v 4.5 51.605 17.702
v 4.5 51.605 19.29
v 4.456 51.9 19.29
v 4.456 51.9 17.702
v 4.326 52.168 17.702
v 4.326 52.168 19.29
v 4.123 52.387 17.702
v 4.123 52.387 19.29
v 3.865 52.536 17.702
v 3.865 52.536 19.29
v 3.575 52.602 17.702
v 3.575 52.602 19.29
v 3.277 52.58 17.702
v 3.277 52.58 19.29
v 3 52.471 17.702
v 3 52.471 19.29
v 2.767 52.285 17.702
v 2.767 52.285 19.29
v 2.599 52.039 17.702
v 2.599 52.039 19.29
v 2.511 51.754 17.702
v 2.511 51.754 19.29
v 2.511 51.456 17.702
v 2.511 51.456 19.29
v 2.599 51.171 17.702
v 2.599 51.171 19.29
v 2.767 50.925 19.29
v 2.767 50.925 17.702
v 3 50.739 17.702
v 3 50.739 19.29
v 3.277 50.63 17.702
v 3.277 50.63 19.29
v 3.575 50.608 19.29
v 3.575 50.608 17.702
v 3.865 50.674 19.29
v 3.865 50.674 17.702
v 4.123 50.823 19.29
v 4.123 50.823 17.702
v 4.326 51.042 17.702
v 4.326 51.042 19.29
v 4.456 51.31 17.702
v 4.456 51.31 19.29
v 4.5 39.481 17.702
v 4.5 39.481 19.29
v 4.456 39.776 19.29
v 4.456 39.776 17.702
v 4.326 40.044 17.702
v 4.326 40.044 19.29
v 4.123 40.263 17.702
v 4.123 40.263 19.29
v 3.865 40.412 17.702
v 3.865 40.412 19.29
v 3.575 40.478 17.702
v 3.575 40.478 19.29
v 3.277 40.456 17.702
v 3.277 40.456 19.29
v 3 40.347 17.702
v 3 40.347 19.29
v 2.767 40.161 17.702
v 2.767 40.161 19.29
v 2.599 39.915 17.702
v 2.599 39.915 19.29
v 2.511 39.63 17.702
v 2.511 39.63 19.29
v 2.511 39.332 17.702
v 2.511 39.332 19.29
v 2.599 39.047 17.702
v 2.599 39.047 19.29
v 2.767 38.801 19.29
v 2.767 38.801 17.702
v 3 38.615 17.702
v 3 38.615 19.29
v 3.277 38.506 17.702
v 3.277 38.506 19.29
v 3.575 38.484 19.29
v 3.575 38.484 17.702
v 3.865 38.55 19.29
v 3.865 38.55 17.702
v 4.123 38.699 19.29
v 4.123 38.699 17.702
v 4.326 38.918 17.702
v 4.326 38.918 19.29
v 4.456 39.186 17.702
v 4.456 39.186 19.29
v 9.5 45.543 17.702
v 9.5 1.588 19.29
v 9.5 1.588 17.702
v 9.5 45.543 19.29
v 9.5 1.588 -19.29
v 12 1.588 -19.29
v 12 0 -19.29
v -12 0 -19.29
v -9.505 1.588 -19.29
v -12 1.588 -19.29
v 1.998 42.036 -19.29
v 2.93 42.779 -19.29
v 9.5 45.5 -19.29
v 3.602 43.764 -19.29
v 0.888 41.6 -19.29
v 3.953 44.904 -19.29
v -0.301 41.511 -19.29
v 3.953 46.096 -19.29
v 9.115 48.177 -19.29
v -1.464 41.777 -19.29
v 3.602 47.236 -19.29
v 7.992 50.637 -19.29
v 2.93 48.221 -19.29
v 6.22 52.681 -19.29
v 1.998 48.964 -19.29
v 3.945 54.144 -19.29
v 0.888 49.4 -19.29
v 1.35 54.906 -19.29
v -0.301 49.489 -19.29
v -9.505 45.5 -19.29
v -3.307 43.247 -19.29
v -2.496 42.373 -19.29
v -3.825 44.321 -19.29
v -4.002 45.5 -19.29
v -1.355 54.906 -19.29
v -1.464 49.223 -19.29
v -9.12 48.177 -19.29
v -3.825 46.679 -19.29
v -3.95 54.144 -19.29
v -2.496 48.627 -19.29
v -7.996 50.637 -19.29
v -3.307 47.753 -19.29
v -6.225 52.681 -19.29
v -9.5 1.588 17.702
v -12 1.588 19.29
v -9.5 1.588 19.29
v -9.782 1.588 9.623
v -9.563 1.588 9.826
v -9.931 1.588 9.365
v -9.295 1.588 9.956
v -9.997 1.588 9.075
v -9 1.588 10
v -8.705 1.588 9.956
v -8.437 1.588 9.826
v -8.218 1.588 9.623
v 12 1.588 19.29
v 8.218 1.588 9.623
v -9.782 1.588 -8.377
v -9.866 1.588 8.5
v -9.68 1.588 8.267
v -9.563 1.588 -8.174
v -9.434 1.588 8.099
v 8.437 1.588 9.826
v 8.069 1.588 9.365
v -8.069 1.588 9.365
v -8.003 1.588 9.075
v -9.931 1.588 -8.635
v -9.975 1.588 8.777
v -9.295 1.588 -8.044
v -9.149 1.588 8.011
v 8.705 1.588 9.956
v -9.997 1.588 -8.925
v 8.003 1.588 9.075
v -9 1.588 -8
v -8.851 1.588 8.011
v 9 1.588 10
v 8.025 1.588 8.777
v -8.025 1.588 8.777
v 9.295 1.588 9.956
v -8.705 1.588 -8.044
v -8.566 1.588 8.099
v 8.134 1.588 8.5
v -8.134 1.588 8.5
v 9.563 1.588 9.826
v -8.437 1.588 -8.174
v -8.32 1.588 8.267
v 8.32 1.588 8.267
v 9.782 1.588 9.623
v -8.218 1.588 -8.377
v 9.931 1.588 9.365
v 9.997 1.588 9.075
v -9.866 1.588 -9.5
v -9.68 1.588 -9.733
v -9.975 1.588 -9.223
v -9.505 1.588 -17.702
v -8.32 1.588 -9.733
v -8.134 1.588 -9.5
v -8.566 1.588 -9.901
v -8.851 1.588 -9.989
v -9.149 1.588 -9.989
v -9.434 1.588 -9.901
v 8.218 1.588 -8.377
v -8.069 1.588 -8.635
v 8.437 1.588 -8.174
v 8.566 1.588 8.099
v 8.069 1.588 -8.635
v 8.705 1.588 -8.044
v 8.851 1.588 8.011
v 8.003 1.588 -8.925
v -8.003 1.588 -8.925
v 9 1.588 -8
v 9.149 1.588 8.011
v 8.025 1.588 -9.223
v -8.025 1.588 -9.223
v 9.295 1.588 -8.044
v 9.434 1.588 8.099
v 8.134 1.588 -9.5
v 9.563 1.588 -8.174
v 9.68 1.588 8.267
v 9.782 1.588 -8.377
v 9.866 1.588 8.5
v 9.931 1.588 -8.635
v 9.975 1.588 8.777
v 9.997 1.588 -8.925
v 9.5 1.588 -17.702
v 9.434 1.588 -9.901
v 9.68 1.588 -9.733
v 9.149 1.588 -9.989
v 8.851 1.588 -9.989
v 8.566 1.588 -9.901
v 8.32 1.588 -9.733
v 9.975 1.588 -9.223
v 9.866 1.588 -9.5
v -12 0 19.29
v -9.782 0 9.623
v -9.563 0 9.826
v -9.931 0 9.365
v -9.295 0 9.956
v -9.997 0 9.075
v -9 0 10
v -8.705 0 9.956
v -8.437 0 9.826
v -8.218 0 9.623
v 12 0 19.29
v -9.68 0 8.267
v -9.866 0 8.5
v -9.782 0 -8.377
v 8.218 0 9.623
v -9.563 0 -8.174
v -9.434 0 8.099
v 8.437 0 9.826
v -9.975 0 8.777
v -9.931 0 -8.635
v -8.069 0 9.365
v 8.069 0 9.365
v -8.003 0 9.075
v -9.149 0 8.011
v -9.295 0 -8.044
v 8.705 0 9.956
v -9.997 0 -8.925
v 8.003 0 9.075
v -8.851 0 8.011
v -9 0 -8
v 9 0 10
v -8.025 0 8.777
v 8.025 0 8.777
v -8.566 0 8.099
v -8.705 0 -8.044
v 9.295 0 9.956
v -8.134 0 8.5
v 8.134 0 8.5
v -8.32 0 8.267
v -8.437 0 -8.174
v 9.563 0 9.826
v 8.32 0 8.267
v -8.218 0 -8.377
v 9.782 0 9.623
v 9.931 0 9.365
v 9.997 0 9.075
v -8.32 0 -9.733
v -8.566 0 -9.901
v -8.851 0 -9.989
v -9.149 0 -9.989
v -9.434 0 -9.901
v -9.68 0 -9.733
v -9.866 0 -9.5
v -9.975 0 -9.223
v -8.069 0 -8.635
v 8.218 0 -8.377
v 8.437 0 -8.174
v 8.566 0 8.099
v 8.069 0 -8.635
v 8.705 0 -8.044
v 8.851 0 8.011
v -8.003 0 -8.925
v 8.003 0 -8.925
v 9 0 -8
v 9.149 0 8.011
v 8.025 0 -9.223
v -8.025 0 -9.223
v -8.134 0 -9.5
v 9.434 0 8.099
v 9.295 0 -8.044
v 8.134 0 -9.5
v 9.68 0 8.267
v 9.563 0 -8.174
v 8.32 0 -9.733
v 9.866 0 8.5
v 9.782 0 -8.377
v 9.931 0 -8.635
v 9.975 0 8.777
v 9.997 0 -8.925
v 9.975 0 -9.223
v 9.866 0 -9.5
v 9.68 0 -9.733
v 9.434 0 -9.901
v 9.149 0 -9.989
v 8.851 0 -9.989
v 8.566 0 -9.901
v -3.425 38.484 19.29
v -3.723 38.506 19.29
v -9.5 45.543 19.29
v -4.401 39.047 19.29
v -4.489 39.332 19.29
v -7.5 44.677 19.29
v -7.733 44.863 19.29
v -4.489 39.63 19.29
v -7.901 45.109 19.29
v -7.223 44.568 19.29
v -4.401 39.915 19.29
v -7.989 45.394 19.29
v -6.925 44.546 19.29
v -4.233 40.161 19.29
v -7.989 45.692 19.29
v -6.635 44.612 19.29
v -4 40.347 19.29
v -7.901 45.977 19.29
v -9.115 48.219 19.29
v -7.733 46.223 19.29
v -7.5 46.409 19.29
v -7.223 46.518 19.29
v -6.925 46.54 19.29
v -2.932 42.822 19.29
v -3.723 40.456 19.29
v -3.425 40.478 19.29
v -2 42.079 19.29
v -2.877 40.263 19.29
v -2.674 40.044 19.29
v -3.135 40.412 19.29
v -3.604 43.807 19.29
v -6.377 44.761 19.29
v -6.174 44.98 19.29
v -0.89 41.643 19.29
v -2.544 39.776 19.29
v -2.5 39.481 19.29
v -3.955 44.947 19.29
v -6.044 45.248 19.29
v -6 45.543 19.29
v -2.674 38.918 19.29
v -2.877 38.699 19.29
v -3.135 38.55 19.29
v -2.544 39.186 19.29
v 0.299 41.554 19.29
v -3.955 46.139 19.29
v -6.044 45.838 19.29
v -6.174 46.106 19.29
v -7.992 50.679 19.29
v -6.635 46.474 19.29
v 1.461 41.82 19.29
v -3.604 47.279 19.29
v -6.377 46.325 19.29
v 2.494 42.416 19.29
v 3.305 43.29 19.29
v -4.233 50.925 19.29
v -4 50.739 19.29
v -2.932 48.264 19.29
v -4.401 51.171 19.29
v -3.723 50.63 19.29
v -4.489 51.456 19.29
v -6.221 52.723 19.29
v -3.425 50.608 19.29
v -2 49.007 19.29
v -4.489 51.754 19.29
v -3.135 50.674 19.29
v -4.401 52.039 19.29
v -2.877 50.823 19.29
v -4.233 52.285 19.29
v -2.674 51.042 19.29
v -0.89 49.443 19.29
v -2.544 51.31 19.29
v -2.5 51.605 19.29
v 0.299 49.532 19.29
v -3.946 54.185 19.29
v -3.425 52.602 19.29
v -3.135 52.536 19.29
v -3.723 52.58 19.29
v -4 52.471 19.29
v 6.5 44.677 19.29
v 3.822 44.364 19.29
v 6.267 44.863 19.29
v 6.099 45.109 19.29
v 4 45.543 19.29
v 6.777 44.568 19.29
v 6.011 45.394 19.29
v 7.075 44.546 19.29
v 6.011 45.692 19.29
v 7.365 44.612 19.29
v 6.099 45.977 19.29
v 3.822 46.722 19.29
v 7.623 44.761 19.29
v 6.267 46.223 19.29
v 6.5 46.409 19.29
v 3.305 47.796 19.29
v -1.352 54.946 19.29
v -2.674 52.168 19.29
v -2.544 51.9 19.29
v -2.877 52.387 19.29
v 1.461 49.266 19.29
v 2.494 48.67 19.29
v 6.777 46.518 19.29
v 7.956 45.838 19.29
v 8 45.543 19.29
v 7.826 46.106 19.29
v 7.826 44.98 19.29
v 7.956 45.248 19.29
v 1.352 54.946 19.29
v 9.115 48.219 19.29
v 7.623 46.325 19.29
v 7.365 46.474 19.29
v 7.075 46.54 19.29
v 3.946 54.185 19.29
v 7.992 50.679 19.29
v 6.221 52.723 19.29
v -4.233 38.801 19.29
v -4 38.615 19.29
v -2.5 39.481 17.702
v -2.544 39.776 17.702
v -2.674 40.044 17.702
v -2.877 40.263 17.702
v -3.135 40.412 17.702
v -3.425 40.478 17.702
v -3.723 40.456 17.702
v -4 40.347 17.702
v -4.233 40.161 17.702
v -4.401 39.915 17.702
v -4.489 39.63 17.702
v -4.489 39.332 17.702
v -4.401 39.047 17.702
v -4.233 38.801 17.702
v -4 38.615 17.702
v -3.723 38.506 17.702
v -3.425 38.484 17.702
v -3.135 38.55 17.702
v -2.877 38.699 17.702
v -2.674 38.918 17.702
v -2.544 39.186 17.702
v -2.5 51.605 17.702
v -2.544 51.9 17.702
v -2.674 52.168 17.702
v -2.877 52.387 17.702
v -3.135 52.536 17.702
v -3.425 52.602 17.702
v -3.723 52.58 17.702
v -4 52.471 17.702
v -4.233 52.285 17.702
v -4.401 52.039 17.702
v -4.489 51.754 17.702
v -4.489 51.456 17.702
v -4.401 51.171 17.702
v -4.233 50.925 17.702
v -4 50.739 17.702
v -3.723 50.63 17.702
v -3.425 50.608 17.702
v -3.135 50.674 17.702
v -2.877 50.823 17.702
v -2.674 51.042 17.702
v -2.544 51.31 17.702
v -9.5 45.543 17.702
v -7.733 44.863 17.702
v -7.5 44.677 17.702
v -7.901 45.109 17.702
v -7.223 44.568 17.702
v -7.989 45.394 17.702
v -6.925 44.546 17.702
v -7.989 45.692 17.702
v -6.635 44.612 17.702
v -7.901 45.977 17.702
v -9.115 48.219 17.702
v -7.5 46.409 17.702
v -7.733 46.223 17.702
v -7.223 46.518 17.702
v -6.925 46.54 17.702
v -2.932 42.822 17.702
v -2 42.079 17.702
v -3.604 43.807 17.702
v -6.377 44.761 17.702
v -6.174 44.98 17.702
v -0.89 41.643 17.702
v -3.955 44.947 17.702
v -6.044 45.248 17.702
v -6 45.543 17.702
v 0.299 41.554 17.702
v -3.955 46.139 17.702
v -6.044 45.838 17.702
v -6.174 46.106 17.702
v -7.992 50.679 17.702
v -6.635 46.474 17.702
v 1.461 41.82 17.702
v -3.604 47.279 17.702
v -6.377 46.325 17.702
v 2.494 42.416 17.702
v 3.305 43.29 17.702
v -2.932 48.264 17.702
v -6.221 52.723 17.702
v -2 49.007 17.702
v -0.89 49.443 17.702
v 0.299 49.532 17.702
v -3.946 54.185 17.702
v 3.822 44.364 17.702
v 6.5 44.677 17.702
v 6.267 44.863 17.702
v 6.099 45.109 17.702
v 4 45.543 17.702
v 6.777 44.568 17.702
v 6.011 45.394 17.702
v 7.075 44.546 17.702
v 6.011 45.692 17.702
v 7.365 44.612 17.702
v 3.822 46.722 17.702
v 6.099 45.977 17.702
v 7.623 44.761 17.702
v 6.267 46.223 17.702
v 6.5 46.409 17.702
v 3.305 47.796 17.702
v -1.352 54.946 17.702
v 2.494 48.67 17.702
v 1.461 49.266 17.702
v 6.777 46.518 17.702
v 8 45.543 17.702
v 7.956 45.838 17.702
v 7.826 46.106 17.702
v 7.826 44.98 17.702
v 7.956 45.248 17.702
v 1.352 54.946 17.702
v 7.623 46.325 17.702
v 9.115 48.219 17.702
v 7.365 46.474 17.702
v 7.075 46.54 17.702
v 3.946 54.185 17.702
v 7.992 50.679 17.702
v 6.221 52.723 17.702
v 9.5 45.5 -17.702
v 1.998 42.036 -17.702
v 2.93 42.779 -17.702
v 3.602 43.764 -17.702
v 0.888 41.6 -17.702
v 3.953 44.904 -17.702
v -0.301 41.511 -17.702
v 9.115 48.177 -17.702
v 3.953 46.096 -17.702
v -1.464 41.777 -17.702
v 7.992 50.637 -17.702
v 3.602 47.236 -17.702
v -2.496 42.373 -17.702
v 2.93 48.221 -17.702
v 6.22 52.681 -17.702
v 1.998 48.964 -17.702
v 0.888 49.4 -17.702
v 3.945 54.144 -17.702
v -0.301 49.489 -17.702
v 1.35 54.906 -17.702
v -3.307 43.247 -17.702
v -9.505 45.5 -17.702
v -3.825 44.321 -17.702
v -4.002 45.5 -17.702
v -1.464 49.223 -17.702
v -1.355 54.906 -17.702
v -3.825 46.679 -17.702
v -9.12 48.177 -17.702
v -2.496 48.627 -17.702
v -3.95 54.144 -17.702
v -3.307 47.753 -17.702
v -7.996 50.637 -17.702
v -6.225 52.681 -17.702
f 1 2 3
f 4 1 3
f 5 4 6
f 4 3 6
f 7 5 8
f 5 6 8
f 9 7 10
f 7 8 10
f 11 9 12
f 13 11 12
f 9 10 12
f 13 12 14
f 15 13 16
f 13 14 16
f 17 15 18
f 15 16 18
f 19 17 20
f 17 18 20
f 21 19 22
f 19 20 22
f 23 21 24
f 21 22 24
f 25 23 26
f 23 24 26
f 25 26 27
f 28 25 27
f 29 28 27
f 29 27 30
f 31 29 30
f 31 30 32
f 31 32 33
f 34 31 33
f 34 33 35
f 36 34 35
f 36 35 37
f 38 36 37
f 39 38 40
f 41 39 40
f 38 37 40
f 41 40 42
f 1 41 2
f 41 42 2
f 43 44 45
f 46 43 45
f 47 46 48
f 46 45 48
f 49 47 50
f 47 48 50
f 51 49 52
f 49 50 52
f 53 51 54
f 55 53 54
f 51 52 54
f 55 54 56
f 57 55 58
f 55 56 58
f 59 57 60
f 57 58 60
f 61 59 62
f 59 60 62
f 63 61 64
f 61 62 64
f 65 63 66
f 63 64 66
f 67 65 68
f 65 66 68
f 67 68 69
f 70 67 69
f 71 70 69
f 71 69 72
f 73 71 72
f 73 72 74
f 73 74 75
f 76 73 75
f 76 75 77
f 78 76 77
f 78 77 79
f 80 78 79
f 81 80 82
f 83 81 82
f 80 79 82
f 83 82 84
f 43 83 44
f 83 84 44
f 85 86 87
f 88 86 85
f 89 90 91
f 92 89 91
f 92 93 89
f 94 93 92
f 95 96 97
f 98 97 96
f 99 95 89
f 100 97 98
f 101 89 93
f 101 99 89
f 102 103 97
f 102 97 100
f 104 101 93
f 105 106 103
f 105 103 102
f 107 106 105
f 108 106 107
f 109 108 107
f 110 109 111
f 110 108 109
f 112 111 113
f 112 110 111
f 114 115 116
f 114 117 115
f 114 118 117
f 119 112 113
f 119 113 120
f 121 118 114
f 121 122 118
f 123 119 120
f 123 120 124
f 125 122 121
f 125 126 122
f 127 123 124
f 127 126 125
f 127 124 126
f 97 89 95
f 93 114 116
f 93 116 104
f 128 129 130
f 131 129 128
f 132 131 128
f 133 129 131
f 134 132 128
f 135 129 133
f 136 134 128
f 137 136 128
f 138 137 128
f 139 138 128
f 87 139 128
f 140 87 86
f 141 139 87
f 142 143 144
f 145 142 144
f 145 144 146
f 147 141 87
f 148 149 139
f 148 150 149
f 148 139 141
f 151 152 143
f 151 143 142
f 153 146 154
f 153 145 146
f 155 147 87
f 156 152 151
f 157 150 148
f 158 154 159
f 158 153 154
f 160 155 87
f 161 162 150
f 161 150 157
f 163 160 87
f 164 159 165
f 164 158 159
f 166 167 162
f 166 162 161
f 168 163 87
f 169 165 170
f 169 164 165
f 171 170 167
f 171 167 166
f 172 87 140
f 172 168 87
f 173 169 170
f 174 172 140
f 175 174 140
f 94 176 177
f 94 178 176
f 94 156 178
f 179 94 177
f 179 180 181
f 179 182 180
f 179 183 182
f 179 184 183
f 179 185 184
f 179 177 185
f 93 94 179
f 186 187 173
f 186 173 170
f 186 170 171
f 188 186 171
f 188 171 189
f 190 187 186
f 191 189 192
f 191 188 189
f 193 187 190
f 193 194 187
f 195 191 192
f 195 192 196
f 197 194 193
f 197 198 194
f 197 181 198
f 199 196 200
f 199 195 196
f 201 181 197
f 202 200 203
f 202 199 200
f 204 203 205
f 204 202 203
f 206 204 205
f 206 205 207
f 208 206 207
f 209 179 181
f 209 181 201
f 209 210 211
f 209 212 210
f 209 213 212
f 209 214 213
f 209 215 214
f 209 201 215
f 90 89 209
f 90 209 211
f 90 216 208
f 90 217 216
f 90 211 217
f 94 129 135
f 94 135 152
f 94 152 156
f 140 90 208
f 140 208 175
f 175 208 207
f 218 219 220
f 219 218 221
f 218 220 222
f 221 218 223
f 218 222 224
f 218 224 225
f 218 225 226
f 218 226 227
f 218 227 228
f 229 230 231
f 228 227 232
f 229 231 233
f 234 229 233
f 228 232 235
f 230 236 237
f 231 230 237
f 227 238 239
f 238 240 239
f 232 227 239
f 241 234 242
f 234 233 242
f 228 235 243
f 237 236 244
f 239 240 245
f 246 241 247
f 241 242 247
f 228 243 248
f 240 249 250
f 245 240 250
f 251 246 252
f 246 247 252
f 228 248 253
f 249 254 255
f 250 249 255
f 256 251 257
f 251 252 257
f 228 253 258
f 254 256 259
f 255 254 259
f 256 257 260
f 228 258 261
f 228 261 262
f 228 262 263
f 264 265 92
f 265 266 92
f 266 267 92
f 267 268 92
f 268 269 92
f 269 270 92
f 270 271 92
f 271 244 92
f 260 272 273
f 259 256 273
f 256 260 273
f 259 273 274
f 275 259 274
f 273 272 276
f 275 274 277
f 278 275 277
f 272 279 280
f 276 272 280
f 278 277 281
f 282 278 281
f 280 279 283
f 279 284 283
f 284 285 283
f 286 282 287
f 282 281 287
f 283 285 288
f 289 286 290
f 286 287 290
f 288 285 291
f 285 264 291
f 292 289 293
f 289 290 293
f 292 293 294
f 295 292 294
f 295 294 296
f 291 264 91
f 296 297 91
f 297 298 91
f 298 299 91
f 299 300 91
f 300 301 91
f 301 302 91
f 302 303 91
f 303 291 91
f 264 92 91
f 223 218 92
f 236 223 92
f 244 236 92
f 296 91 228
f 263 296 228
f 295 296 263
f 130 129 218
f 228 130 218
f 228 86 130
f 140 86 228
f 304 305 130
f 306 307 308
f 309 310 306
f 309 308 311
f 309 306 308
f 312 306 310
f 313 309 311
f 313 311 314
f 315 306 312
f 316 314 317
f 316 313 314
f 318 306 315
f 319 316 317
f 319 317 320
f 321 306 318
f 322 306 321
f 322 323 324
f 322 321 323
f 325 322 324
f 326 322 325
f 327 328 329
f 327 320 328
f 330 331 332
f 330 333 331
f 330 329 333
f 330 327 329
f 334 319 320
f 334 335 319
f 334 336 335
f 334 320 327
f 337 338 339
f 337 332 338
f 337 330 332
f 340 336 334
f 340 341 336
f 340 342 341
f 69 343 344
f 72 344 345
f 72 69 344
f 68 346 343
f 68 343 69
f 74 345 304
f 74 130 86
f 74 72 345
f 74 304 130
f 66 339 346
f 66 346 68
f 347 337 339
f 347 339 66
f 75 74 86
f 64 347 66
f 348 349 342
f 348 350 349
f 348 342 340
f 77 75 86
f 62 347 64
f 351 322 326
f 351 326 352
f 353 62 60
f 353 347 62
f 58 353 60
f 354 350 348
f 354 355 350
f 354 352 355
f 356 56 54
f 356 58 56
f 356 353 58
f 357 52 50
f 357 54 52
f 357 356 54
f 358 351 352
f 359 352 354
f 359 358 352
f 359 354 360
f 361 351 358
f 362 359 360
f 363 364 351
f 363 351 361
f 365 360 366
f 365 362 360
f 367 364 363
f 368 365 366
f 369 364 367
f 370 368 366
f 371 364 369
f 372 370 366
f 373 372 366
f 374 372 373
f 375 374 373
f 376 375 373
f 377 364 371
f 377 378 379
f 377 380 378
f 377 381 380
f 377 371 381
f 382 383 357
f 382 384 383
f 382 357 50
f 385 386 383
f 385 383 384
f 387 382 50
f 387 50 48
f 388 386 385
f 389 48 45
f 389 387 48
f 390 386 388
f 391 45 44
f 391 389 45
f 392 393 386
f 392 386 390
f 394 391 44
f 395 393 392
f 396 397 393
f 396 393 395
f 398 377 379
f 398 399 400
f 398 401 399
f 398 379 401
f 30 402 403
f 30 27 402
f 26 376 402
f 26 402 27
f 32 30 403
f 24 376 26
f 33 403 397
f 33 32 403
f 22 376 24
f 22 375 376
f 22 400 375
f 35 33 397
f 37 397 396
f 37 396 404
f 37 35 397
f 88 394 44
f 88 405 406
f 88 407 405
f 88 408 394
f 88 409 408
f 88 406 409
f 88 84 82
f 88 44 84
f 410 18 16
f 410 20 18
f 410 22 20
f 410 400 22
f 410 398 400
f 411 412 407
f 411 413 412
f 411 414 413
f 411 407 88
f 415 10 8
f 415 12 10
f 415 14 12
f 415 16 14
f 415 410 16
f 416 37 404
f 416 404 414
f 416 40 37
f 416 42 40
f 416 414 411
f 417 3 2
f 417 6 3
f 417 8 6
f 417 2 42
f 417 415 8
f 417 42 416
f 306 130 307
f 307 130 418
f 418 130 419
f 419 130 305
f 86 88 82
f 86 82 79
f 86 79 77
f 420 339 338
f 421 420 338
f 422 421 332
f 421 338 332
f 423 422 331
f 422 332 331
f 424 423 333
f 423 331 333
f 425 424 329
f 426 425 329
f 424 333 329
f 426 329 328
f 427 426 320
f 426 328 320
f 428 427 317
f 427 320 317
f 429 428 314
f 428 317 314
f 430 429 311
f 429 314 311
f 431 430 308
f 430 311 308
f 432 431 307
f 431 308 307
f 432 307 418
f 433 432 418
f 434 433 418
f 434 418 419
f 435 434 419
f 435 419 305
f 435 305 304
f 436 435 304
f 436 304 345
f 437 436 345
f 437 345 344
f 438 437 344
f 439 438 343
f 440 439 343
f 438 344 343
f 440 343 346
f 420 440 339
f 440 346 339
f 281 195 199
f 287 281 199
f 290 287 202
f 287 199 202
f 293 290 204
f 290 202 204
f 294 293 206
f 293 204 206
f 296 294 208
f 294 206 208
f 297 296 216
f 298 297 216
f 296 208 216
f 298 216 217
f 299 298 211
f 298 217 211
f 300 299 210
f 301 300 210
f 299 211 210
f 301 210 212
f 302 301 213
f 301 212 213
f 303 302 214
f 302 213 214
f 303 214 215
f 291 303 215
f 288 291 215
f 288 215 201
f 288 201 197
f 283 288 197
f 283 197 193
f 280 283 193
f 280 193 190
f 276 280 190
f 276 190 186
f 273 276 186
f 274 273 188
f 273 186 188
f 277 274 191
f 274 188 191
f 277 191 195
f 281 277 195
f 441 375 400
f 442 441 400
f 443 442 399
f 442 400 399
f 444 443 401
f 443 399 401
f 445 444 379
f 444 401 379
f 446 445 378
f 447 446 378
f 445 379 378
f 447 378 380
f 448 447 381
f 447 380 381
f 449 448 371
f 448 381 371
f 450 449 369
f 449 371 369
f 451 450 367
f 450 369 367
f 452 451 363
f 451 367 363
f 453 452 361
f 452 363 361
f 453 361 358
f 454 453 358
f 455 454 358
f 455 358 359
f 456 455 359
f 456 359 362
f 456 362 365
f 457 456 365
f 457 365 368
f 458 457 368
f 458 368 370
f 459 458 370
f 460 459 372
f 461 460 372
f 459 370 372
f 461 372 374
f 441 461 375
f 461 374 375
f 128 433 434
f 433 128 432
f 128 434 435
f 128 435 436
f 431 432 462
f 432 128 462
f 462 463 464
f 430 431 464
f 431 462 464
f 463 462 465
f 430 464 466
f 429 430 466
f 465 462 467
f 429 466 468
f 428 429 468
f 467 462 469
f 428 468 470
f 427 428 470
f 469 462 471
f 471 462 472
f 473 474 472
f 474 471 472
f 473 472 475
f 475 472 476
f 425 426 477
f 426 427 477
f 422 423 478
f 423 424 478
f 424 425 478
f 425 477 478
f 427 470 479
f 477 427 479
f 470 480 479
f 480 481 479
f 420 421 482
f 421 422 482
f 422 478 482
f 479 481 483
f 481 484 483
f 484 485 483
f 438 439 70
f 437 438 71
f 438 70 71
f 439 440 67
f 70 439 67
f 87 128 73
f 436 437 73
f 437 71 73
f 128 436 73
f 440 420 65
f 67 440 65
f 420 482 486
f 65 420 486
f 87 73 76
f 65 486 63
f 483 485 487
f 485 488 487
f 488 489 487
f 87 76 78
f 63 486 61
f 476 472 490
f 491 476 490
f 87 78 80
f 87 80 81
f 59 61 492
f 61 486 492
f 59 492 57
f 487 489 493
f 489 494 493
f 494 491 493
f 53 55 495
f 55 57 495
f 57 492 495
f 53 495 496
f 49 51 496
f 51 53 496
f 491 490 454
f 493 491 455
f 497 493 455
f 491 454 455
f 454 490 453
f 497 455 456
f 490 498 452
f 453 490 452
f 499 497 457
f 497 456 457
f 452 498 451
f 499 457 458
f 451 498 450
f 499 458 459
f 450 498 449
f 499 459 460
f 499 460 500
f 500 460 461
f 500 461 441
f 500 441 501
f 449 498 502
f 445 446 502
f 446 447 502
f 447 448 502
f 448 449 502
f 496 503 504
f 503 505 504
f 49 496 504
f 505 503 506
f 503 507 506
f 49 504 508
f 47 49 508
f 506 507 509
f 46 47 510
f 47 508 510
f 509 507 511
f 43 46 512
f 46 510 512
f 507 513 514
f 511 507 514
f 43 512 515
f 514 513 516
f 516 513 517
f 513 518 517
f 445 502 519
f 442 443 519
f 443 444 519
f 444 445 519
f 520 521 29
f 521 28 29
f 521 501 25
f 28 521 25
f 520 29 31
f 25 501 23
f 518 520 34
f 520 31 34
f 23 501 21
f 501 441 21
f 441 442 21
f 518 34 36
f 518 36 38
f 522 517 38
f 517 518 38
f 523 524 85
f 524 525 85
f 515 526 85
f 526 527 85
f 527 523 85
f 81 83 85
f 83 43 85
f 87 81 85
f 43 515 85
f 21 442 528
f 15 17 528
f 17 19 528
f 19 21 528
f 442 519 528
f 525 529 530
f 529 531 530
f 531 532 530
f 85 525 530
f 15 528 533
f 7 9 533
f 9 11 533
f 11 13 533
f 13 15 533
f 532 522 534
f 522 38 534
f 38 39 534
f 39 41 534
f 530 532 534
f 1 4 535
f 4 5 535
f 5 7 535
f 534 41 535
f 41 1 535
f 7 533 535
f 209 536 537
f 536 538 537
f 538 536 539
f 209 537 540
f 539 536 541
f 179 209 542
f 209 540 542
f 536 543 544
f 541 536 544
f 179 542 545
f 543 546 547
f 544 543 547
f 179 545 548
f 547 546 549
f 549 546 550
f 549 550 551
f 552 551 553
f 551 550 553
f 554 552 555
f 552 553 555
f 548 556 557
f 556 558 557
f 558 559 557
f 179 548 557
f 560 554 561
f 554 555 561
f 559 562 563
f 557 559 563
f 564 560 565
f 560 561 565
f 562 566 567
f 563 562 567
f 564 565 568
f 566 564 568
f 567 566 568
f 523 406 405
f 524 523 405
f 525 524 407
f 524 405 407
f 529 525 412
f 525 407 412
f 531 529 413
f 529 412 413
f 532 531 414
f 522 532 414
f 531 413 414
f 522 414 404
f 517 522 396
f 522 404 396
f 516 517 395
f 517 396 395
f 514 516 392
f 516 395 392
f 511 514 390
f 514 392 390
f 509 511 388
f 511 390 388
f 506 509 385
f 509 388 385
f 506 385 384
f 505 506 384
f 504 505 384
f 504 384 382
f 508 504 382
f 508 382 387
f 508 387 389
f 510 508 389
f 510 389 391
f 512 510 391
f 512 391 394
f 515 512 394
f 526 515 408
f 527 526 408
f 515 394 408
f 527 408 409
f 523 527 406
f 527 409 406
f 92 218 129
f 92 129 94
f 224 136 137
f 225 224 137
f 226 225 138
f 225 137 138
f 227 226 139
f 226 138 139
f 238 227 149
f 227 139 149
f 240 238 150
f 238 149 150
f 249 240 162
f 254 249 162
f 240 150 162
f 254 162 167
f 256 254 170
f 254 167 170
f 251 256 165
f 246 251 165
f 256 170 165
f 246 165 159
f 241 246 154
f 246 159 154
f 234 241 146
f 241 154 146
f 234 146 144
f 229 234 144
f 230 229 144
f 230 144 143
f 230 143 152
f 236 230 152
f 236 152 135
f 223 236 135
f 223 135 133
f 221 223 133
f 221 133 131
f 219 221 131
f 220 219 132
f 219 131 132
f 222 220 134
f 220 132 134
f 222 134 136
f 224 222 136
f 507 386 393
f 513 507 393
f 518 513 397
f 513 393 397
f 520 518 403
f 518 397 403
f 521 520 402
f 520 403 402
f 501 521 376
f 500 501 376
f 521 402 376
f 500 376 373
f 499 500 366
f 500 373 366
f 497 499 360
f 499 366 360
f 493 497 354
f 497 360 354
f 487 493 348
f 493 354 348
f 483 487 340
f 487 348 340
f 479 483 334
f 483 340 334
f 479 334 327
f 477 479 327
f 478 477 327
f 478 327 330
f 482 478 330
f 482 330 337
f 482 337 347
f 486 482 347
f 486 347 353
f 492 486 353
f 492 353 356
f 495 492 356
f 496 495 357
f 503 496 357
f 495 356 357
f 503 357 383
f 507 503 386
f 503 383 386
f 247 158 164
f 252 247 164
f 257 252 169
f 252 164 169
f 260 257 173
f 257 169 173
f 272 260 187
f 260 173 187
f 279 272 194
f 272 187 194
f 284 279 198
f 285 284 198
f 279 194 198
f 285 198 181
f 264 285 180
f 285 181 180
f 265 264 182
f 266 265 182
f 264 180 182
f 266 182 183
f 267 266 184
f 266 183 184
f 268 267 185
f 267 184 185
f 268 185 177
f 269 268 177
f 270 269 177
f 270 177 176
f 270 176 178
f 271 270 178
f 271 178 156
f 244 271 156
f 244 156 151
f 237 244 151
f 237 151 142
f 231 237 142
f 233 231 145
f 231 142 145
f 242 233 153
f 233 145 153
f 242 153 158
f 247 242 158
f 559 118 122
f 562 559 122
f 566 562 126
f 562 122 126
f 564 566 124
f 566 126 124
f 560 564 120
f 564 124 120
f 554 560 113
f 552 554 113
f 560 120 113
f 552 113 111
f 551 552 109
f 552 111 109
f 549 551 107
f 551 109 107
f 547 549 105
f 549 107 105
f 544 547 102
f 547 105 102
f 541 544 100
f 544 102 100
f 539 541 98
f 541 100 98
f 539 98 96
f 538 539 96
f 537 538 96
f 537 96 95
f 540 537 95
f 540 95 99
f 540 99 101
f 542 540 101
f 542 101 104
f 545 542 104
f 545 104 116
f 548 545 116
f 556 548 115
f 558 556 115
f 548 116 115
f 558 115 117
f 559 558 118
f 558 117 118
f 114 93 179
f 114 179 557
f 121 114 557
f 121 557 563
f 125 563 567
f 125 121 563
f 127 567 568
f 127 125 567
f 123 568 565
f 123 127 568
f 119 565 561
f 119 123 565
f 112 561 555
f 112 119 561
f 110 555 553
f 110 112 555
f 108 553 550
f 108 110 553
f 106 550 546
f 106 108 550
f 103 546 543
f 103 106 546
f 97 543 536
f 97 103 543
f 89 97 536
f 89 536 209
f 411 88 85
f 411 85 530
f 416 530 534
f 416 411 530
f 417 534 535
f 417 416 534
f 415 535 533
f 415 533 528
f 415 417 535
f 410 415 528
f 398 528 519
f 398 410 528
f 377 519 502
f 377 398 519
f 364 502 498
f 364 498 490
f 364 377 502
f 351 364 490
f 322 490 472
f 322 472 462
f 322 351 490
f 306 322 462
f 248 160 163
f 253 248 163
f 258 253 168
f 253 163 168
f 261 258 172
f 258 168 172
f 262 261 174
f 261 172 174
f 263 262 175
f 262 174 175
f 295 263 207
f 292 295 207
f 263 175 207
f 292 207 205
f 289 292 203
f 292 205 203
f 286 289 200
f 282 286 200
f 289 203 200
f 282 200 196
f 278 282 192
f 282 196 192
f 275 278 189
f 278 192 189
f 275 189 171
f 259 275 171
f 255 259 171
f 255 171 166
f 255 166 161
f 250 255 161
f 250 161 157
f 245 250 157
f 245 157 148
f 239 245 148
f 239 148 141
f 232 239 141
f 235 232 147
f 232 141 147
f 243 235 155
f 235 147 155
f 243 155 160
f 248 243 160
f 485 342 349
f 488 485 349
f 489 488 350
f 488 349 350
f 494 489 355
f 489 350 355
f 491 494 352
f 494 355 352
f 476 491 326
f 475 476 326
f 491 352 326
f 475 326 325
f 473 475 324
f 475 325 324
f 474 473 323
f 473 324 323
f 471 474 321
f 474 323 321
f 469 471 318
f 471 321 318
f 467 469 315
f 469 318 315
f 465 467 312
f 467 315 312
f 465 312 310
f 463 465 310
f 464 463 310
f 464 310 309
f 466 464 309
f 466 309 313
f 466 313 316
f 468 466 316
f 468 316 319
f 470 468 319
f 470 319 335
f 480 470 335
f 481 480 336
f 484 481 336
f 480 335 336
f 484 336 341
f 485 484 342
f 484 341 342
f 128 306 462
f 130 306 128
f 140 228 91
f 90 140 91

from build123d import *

# Parameters (mm, degrees)
ESQUISSE1_W             = 24
ESQUISSE1_H             = 38.58
BOSS_EXTRU_1_DEPTH      = 1.5875
ESQUISSE5_R             = 1
ESQUISSE5_R_2           = 4
BOSS_EXTRU_8_DEPTH      = 1.5875
ESQUISSE8_R             = 4
BOSS_EXTRU_10_DEPTH     = 1.5875
ESQUISSE11_R            = 1
ENL_V_MAT_EXTRU_3_DEPTH = 1.5875


with BuildPart() as part:
    # Esquisse1 → Boss.-Extru.1 (new body)
    with BuildSketch(Plane(origin=(0, 0, 0), x_dir=(1, 0, 0), z_dir=(0, 1, 0))):
        Rectangle(ESQUISSE1_W, ESQUISSE1_H)
    extrude(amount=BOSS_EXTRU_1_DEPTH)

    # Esquisse5 → Boss.-Extru.8 (add)
    with BuildSketch(Plane.XY.offset(19.29)):
        with BuildLine():
            Line((-9.5, 45.543001341), (-9.5, 1.5875))
            Line((-9.5, 1.5875), (9.5, 1.5875))
            Line((9.5, 1.5875), (9.5, 45.543001341))
            ThreePointArc((9.5, 45.543001341), (0, 55.043001341), (-9.5, 45.543001341))
        make_face()
        with Locations((-3.5, 39.480823515)):
            Circle(ESQUISSE5_R, mode=Mode.SUBTRACT)
        with Locations((-7, 45.543001341)):
            Circle(ESQUISSE5_R, mode=Mode.SUBTRACT)
        with Locations((-3.5, 51.605179168)):
            Circle(ESQUISSE5_R, mode=Mode.SUBTRACT)
        with Locations((3.5, 39.480823515)):
            Circle(ESQUISSE5_R, mode=Mode.SUBTRACT)
        with Locations((0, 45.543001341)):
            Circle(ESQUISSE5_R_2, mode=Mode.SUBTRACT)
        with Locations((3.5, 51.605179168)):
            Circle(ESQUISSE5_R, mode=Mode.SUBTRACT)
        with Locations((7, 45.543001341)):
            Circle(ESQUISSE5_R, mode=Mode.SUBTRACT)
    extrude(amount=-BOSS_EXTRU_8_DEPTH)

    # Esquisse8 → Boss.-Extru.10 (add)
    with BuildSketch(Plane(origin=(0, 0, -19.29), x_dir=(-1, 0, 0), z_dir=(0, 0, -1))):
        with BuildLine():
            Line((-9.5, 45.5), (-9.5, 1.5875))
            Line((-9.5, 1.5875), (9.504737636, 1.5875))
            Line((9.504737636, 1.5875), (9.504737636, 45.5))
            ThreePointArc((9.504737636, 45.5), (0.002368818, 55.002368818), (-9.5, 45.5))
        make_face()
        with Locations((0.002368818, 45.5)):
            Circle(ESQUISSE8_R, mode=Mode.SUBTRACT)
    extrude(amount=-BOSS_EXTRU_10_DEPTH)

    # Esquisse11 → Enlèv. mat.-Extru.3 (cut)
    with BuildSketch(Plane(origin=(0, 1.5875, 0), x_dir=(1, 0, 0), z_dir=(0, 1, 0))):
        with Locations((-9, 9)):
            Circle(ESQUISSE11_R)
        with Locations((9, 9)):
            Circle(ESQUISSE11_R)
        with Locations((9, -9)):
            Circle(ESQUISSE11_R)
        with Locations((-9, -9)):
            Circle(ESQUISSE11_R)
    extrude(amount=-ENL_V_MAT_EXTRU_3_DEPTH, mode=Mode.SUBTRACT)


solid = part.part
